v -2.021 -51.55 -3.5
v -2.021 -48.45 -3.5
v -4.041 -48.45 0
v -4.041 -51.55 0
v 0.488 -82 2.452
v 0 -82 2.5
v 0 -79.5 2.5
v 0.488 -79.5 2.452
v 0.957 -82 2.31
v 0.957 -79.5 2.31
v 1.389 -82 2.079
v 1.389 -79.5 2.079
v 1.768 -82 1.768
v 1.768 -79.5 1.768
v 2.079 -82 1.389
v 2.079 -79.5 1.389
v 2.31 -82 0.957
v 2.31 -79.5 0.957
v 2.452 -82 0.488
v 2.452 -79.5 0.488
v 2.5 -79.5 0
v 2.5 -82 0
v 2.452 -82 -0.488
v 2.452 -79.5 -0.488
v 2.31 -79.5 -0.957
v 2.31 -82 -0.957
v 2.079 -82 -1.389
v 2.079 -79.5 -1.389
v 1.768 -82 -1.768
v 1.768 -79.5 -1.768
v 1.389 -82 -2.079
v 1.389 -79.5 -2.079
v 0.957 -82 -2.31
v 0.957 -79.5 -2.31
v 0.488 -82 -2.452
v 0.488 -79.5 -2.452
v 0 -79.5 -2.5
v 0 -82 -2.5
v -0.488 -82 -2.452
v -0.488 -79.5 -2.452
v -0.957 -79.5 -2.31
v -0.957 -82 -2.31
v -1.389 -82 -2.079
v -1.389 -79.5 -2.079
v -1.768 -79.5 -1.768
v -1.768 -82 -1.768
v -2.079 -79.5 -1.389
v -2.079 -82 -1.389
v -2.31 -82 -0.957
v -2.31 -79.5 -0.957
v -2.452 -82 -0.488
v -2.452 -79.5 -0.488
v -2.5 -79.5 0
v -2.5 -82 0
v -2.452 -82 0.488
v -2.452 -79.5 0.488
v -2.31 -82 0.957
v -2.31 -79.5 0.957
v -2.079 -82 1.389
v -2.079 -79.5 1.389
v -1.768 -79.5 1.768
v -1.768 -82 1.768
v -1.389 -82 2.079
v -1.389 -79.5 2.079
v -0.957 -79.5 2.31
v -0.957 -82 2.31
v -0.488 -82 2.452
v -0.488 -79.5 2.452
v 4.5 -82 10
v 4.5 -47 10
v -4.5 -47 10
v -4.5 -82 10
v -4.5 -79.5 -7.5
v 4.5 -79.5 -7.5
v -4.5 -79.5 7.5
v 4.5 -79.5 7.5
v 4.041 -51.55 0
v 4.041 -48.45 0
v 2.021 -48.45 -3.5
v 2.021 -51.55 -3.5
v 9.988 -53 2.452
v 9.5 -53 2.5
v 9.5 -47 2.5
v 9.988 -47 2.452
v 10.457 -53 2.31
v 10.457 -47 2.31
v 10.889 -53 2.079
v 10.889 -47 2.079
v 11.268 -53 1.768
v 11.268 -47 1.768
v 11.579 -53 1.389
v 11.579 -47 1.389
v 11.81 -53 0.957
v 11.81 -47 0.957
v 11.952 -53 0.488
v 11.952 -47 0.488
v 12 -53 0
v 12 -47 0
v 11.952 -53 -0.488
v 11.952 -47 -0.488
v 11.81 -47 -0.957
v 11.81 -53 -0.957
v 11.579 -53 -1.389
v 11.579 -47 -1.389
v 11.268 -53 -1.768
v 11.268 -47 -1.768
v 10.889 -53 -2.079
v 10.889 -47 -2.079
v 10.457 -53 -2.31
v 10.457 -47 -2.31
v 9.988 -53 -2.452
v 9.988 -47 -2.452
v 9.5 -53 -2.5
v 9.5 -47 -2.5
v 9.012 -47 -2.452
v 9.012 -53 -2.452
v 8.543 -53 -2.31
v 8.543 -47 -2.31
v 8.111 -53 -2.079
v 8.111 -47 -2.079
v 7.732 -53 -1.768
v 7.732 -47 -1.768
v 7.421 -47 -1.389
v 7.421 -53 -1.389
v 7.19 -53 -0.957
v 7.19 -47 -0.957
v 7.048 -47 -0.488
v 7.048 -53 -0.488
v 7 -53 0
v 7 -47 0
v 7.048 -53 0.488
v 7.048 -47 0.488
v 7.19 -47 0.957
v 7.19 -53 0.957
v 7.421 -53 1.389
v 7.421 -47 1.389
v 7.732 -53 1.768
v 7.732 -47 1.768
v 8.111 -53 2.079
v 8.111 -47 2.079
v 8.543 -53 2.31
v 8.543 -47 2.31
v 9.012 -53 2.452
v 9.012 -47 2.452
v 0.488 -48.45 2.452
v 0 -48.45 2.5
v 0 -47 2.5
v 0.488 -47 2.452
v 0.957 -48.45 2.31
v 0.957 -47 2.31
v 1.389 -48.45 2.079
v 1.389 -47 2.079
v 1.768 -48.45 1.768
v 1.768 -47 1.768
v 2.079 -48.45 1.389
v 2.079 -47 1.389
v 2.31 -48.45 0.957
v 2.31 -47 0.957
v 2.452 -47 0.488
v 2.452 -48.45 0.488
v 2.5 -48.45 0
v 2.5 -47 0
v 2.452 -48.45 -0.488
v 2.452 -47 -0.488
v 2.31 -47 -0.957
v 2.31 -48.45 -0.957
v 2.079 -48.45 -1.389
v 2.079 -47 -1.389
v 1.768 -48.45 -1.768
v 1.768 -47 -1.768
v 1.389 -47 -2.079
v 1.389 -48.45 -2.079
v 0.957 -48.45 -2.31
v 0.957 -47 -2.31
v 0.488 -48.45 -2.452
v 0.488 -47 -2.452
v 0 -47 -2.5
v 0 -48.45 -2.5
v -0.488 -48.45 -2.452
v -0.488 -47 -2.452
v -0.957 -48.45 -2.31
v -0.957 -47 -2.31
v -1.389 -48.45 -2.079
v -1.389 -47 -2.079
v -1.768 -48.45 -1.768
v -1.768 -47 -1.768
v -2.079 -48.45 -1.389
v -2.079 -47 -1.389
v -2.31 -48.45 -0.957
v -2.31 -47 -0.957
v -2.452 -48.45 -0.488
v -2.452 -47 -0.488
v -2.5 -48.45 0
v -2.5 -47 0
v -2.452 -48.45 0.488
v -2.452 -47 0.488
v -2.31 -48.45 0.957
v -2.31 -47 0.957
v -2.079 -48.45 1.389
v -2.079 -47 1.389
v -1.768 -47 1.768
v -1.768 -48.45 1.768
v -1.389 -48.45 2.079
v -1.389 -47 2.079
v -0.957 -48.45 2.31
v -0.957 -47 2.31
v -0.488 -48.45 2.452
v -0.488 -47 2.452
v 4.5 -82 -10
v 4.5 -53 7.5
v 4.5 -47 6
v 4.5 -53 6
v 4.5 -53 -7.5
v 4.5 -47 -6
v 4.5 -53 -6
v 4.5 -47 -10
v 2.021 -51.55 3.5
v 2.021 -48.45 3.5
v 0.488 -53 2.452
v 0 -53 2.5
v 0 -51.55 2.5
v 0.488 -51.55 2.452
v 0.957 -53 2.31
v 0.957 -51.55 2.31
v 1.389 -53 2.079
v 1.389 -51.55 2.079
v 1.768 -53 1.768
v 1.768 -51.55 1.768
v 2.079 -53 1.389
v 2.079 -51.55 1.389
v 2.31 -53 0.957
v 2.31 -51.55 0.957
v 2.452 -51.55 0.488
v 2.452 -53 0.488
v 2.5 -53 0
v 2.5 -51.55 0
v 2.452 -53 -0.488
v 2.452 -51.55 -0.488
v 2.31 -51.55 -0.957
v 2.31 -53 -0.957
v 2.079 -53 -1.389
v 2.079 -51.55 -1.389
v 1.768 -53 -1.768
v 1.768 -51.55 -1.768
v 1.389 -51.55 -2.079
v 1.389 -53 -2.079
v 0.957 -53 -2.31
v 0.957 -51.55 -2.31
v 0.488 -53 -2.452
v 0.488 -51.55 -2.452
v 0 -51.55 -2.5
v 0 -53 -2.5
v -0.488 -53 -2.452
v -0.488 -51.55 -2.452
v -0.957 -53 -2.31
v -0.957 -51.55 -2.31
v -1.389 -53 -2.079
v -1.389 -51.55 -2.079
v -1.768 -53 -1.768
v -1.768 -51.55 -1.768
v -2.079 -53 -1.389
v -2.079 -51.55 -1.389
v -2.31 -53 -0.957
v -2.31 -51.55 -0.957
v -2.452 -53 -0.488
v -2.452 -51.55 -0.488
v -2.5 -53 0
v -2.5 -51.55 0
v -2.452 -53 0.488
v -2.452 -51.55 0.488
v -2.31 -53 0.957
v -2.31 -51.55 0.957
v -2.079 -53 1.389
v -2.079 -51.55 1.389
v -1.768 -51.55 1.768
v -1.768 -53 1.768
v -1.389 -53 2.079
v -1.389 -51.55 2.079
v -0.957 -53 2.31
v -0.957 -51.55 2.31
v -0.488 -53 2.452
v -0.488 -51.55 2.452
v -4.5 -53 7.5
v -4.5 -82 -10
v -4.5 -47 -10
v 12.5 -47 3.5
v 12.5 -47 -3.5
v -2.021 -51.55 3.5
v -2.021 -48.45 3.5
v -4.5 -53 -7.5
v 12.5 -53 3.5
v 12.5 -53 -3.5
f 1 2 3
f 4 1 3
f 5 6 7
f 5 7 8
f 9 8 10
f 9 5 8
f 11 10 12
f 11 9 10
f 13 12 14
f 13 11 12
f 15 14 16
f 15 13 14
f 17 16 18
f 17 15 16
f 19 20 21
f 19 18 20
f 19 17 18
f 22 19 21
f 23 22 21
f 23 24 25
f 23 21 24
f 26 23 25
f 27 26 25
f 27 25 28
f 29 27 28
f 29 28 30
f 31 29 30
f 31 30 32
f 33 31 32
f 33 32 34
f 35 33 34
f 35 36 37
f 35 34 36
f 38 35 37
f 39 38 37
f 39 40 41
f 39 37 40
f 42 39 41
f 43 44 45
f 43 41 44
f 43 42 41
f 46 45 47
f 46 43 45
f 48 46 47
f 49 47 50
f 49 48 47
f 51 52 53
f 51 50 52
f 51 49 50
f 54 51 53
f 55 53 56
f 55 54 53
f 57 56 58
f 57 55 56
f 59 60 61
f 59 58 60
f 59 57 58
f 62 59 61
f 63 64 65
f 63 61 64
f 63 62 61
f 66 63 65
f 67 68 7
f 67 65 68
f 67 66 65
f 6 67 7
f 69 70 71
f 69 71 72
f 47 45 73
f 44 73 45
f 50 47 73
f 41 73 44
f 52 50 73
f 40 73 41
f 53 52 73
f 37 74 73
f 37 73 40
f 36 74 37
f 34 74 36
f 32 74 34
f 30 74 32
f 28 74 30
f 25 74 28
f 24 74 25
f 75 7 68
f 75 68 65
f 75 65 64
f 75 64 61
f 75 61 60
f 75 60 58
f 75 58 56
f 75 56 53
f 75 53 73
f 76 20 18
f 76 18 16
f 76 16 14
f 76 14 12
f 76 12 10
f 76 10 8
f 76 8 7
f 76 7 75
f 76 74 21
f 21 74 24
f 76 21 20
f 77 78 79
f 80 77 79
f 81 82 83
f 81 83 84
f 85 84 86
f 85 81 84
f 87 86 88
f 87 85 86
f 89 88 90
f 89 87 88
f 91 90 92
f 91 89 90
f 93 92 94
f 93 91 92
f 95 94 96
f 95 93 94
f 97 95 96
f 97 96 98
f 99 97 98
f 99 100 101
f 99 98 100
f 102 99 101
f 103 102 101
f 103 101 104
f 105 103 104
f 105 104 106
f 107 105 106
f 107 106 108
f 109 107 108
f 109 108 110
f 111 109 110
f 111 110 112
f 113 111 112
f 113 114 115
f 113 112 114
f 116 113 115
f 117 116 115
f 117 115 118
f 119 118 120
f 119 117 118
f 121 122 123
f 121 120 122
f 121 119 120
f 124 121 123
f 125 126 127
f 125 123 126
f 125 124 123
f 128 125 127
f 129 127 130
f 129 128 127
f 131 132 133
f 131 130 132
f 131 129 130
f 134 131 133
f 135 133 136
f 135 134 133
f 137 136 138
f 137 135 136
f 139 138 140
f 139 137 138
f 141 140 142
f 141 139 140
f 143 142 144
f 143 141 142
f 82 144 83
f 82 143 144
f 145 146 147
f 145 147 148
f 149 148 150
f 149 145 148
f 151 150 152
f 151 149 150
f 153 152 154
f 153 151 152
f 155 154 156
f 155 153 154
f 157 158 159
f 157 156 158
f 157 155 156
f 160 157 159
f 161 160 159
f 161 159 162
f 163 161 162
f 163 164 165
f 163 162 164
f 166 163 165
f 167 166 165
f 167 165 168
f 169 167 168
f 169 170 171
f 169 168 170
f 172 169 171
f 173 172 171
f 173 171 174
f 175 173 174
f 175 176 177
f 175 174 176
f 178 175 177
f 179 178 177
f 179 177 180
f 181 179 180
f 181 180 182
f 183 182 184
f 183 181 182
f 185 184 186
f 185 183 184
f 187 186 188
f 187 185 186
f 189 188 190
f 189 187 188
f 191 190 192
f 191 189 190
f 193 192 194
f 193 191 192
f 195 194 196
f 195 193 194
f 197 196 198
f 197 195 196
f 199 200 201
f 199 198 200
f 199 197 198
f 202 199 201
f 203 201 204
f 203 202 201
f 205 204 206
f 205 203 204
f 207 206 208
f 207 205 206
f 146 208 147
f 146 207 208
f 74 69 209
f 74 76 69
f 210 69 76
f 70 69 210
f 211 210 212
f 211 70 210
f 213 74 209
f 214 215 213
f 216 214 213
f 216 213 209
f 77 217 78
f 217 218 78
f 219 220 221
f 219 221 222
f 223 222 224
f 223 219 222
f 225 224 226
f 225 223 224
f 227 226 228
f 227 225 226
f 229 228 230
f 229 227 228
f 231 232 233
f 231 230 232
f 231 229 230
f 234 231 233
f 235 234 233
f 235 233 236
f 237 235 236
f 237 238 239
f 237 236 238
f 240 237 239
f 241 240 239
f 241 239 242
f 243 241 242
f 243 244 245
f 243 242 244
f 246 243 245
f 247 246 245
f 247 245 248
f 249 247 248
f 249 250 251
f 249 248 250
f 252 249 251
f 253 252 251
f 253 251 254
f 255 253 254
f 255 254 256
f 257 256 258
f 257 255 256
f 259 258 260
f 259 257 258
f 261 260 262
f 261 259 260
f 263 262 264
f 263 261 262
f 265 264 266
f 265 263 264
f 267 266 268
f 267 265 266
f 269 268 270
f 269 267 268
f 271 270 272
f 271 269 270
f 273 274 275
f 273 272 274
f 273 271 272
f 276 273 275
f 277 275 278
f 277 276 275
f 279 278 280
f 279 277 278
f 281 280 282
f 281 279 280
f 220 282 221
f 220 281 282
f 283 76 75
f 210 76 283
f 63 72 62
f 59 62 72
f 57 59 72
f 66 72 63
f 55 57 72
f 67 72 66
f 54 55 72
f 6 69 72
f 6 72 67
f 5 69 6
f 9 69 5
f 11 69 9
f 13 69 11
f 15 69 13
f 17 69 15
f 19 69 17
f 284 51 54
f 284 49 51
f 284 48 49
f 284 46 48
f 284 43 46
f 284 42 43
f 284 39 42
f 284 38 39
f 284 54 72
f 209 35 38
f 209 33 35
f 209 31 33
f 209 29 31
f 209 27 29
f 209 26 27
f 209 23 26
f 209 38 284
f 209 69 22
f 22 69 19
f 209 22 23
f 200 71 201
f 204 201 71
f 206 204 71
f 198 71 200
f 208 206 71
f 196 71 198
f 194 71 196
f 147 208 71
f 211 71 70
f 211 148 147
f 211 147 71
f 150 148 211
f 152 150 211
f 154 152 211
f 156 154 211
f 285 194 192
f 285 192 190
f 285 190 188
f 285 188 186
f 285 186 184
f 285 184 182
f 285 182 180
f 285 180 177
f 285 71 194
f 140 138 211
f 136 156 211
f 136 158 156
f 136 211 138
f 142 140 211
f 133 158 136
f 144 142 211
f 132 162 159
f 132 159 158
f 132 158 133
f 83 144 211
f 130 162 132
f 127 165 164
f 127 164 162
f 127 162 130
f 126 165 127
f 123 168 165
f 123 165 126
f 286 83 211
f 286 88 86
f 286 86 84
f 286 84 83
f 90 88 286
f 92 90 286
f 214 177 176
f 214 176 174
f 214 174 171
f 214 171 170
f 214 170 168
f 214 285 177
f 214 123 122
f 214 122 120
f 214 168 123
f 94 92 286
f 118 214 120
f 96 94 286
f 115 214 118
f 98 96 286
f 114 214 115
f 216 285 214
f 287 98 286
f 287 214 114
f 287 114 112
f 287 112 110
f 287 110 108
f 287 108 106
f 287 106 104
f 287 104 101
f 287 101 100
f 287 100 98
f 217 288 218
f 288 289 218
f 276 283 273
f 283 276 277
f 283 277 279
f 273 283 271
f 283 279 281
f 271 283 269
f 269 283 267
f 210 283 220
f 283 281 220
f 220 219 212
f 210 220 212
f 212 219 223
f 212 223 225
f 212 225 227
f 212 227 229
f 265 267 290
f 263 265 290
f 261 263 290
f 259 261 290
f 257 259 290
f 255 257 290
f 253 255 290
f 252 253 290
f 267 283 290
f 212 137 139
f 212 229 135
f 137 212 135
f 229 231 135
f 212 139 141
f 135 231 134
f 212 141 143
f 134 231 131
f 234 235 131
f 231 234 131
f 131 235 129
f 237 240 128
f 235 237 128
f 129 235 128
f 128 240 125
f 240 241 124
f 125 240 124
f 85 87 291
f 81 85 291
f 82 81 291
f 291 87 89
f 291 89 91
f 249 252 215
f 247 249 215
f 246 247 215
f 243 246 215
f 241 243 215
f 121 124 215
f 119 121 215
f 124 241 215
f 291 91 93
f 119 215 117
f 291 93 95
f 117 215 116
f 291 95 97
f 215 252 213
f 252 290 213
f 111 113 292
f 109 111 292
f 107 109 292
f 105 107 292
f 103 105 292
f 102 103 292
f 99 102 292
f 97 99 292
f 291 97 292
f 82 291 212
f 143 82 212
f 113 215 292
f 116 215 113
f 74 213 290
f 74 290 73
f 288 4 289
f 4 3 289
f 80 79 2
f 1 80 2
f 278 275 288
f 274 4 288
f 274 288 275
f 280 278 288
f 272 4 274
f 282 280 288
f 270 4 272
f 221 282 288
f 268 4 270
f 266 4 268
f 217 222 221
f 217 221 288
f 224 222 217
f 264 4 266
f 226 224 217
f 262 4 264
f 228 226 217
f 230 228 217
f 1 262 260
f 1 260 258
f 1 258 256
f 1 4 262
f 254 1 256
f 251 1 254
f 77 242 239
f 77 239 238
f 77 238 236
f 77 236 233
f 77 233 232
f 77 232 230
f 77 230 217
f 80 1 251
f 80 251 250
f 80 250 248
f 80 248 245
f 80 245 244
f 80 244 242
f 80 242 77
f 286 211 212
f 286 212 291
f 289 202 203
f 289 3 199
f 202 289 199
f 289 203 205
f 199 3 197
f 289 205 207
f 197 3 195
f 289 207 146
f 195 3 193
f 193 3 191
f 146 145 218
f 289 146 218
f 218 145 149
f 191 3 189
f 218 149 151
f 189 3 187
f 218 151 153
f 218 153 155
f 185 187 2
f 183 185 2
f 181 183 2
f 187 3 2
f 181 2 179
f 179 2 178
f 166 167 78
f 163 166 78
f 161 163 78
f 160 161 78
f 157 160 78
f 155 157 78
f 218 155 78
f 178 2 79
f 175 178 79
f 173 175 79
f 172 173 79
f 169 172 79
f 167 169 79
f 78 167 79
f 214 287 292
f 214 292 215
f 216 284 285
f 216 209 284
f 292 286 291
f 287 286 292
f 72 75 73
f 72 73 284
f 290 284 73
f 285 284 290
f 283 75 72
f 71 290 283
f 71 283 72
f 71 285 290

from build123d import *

# Parameters (mm, degrees)
BOSS_EXTRUDE1_DEPTH             = 3
CUT_EXTRUDE1_DEPTH              = 17.286497475
CUT_EXTRUDE1_DEPTH_BACK         = 17.286497475
SUPPORT_HOLE_R                  = 2.5
EXTRUDE_THIN1_REACH             = 57.365
EXTRUDE_THIN1_DIRECTION_2_REACH = 57.365
CUT_EXTRUDE2_DEPTH              = 36.780581326
CUT_EXTRUDE2_DEPTH_BACK         = 36.780581326
SKETCH6_R                       = 2.5
CUT_EXTRUDE3_DEPTH              = 1.55


with BuildPart() as part:
    # Sketch3 → Boss-Extrude1 (new, symmetric)
    with BuildSketch(Plane(origin=(0, -50, 0), x_dir=(1, 0, 0), z_dir=(0, 1, 0))):
        Polygon((-4.5, 10), (-4.5, -10), (4.5, -10), (4.5, -6), (12.5, -3.5), (12.5, 3.5), (4.5, 6), (4.5, 10), align=None)
    extrude(amount=BOSS_EXTRUDE1_DEPTH, both=True)

    # Support_hole → Cut-Extrude1 (cut, two sides: drawn at the far end of the back side and taken through both)
    with BuildSketch(Plane(origin=(0, -50, 0), x_dir=(1, 0, 0), z_dir=(0, 1, 0)).offset(-CUT_EXTRUDE1_DEPTH_BACK)):
        with Locations((9.5, 0)):
            Circle(SUPPORT_HOLE_R)
    extrude(amount=CUT_EXTRUDE1_DEPTH + CUT_EXTRUDE1_DEPTH_BACK, mode=Mode.SUBTRACT)

    # Extrude-Thin1: up to this face of the body (flat: up to its plane)
    extrude_thin1_end = Plane(part.part.faces().sort_by_distance((4.5, -50, 8))[0])
    # Sketch8 → Extrude-Thin1 (add, up to the picked face)
    with BuildSketch(Plane(origin=(0, 0, 0), x_dir=(0, 0, -1), z_dir=(1, 0, 0)), mode=Mode.PRIVATE) as extrude_thin1_sk1:
        Polygon((-10, -53), (-10, -82), (10, -82), (10, -53), (7.5, -53), (7.5, -79.5), (-7.5, -79.5), (-7.5, -53), align=None)
    extrude_thin1_tool1 = split(extrude(extrude_thin1_sk1.sketch, amount=EXTRUDE_THIN1_REACH, mode=Mode.PRIVATE), bisect_by=extrude_thin1_end, keep=Keep.BOTH, mode=Mode.PRIVATE)
    add(extrude_thin1_tool1.solids().sort_by(Axis((0, -67.5, 9.647722), (1, 0, 0)))[0])

    # Extrude-Thin1 direction 2: up to this face of the body (flat: up to its plane)
    extrude_thin1_direction_2_end = Plane(part.part.faces().sort_by_distance((-4.5, -50, 0))[0])
    # Sketch8 → Extrude-Thin1 direction 2 (add, up to the picked face)
    with BuildSketch(Plane(origin=(0, 0, 0), x_dir=(0, 0, -1), z_dir=(1, 0, 0)), mode=Mode.PRIVATE) as extrude_thin1_direction_2_sk1:
        Polygon((-10, -53), (-10, -82), (10, -82), (10, -53), (7.5, -53), (7.5, -79.5), (-7.5, -79.5), (-7.5, -53), align=None)
    extrude_thin1_direction_2_tool1 = split(extrude(extrude_thin1_direction_2_sk1.sketch, amount=-EXTRUDE_THIN1_DIRECTION_2_REACH, mode=Mode.PRIVATE), bisect_by=extrude_thin1_direction_2_end, keep=Keep.BOTH, mode=Mode.PRIVATE)
    add(extrude_thin1_direction_2_tool1.solids().sort_by(Axis((0, -67.5, 9.647722), (-1, 0, 0)))[0])

    # Sketch6 → Cut-Extrude2 (cut, two sides: drawn at the far end of the back side and taken through both)
    with BuildSketch(Plane(origin=(0, -50, 0), x_dir=(1, 0, 0), z_dir=(0, 1, 0)).offset(-CUT_EXTRUDE2_DEPTH_BACK)):
        Circle(SKETCH6_R)
    extrude(amount=CUT_EXTRUDE2_DEPTH + CUT_EXTRUDE2_DEPTH_BACK, mode=Mode.SUBTRACT)

    # Sketch7 → Cut-Extrude3 (cut, symmetric)
    with BuildSketch(Plane(origin=(0, -50, 0), x_dir=(1, 0, 0), z_dir=(0, 1, 0))):
        Polygon((2.020725942, -3.5), (4.041451884, 0), (2.020725942, 3.5), (-2.020725942, 3.5), (-4.041451884, 0), (-2.020725942, -3.5), align=None)
    extrude(amount=CUT_EXTRUDE3_DEPTH, both=True, mode=Mode.SUBTRACT)


solid = part.part
